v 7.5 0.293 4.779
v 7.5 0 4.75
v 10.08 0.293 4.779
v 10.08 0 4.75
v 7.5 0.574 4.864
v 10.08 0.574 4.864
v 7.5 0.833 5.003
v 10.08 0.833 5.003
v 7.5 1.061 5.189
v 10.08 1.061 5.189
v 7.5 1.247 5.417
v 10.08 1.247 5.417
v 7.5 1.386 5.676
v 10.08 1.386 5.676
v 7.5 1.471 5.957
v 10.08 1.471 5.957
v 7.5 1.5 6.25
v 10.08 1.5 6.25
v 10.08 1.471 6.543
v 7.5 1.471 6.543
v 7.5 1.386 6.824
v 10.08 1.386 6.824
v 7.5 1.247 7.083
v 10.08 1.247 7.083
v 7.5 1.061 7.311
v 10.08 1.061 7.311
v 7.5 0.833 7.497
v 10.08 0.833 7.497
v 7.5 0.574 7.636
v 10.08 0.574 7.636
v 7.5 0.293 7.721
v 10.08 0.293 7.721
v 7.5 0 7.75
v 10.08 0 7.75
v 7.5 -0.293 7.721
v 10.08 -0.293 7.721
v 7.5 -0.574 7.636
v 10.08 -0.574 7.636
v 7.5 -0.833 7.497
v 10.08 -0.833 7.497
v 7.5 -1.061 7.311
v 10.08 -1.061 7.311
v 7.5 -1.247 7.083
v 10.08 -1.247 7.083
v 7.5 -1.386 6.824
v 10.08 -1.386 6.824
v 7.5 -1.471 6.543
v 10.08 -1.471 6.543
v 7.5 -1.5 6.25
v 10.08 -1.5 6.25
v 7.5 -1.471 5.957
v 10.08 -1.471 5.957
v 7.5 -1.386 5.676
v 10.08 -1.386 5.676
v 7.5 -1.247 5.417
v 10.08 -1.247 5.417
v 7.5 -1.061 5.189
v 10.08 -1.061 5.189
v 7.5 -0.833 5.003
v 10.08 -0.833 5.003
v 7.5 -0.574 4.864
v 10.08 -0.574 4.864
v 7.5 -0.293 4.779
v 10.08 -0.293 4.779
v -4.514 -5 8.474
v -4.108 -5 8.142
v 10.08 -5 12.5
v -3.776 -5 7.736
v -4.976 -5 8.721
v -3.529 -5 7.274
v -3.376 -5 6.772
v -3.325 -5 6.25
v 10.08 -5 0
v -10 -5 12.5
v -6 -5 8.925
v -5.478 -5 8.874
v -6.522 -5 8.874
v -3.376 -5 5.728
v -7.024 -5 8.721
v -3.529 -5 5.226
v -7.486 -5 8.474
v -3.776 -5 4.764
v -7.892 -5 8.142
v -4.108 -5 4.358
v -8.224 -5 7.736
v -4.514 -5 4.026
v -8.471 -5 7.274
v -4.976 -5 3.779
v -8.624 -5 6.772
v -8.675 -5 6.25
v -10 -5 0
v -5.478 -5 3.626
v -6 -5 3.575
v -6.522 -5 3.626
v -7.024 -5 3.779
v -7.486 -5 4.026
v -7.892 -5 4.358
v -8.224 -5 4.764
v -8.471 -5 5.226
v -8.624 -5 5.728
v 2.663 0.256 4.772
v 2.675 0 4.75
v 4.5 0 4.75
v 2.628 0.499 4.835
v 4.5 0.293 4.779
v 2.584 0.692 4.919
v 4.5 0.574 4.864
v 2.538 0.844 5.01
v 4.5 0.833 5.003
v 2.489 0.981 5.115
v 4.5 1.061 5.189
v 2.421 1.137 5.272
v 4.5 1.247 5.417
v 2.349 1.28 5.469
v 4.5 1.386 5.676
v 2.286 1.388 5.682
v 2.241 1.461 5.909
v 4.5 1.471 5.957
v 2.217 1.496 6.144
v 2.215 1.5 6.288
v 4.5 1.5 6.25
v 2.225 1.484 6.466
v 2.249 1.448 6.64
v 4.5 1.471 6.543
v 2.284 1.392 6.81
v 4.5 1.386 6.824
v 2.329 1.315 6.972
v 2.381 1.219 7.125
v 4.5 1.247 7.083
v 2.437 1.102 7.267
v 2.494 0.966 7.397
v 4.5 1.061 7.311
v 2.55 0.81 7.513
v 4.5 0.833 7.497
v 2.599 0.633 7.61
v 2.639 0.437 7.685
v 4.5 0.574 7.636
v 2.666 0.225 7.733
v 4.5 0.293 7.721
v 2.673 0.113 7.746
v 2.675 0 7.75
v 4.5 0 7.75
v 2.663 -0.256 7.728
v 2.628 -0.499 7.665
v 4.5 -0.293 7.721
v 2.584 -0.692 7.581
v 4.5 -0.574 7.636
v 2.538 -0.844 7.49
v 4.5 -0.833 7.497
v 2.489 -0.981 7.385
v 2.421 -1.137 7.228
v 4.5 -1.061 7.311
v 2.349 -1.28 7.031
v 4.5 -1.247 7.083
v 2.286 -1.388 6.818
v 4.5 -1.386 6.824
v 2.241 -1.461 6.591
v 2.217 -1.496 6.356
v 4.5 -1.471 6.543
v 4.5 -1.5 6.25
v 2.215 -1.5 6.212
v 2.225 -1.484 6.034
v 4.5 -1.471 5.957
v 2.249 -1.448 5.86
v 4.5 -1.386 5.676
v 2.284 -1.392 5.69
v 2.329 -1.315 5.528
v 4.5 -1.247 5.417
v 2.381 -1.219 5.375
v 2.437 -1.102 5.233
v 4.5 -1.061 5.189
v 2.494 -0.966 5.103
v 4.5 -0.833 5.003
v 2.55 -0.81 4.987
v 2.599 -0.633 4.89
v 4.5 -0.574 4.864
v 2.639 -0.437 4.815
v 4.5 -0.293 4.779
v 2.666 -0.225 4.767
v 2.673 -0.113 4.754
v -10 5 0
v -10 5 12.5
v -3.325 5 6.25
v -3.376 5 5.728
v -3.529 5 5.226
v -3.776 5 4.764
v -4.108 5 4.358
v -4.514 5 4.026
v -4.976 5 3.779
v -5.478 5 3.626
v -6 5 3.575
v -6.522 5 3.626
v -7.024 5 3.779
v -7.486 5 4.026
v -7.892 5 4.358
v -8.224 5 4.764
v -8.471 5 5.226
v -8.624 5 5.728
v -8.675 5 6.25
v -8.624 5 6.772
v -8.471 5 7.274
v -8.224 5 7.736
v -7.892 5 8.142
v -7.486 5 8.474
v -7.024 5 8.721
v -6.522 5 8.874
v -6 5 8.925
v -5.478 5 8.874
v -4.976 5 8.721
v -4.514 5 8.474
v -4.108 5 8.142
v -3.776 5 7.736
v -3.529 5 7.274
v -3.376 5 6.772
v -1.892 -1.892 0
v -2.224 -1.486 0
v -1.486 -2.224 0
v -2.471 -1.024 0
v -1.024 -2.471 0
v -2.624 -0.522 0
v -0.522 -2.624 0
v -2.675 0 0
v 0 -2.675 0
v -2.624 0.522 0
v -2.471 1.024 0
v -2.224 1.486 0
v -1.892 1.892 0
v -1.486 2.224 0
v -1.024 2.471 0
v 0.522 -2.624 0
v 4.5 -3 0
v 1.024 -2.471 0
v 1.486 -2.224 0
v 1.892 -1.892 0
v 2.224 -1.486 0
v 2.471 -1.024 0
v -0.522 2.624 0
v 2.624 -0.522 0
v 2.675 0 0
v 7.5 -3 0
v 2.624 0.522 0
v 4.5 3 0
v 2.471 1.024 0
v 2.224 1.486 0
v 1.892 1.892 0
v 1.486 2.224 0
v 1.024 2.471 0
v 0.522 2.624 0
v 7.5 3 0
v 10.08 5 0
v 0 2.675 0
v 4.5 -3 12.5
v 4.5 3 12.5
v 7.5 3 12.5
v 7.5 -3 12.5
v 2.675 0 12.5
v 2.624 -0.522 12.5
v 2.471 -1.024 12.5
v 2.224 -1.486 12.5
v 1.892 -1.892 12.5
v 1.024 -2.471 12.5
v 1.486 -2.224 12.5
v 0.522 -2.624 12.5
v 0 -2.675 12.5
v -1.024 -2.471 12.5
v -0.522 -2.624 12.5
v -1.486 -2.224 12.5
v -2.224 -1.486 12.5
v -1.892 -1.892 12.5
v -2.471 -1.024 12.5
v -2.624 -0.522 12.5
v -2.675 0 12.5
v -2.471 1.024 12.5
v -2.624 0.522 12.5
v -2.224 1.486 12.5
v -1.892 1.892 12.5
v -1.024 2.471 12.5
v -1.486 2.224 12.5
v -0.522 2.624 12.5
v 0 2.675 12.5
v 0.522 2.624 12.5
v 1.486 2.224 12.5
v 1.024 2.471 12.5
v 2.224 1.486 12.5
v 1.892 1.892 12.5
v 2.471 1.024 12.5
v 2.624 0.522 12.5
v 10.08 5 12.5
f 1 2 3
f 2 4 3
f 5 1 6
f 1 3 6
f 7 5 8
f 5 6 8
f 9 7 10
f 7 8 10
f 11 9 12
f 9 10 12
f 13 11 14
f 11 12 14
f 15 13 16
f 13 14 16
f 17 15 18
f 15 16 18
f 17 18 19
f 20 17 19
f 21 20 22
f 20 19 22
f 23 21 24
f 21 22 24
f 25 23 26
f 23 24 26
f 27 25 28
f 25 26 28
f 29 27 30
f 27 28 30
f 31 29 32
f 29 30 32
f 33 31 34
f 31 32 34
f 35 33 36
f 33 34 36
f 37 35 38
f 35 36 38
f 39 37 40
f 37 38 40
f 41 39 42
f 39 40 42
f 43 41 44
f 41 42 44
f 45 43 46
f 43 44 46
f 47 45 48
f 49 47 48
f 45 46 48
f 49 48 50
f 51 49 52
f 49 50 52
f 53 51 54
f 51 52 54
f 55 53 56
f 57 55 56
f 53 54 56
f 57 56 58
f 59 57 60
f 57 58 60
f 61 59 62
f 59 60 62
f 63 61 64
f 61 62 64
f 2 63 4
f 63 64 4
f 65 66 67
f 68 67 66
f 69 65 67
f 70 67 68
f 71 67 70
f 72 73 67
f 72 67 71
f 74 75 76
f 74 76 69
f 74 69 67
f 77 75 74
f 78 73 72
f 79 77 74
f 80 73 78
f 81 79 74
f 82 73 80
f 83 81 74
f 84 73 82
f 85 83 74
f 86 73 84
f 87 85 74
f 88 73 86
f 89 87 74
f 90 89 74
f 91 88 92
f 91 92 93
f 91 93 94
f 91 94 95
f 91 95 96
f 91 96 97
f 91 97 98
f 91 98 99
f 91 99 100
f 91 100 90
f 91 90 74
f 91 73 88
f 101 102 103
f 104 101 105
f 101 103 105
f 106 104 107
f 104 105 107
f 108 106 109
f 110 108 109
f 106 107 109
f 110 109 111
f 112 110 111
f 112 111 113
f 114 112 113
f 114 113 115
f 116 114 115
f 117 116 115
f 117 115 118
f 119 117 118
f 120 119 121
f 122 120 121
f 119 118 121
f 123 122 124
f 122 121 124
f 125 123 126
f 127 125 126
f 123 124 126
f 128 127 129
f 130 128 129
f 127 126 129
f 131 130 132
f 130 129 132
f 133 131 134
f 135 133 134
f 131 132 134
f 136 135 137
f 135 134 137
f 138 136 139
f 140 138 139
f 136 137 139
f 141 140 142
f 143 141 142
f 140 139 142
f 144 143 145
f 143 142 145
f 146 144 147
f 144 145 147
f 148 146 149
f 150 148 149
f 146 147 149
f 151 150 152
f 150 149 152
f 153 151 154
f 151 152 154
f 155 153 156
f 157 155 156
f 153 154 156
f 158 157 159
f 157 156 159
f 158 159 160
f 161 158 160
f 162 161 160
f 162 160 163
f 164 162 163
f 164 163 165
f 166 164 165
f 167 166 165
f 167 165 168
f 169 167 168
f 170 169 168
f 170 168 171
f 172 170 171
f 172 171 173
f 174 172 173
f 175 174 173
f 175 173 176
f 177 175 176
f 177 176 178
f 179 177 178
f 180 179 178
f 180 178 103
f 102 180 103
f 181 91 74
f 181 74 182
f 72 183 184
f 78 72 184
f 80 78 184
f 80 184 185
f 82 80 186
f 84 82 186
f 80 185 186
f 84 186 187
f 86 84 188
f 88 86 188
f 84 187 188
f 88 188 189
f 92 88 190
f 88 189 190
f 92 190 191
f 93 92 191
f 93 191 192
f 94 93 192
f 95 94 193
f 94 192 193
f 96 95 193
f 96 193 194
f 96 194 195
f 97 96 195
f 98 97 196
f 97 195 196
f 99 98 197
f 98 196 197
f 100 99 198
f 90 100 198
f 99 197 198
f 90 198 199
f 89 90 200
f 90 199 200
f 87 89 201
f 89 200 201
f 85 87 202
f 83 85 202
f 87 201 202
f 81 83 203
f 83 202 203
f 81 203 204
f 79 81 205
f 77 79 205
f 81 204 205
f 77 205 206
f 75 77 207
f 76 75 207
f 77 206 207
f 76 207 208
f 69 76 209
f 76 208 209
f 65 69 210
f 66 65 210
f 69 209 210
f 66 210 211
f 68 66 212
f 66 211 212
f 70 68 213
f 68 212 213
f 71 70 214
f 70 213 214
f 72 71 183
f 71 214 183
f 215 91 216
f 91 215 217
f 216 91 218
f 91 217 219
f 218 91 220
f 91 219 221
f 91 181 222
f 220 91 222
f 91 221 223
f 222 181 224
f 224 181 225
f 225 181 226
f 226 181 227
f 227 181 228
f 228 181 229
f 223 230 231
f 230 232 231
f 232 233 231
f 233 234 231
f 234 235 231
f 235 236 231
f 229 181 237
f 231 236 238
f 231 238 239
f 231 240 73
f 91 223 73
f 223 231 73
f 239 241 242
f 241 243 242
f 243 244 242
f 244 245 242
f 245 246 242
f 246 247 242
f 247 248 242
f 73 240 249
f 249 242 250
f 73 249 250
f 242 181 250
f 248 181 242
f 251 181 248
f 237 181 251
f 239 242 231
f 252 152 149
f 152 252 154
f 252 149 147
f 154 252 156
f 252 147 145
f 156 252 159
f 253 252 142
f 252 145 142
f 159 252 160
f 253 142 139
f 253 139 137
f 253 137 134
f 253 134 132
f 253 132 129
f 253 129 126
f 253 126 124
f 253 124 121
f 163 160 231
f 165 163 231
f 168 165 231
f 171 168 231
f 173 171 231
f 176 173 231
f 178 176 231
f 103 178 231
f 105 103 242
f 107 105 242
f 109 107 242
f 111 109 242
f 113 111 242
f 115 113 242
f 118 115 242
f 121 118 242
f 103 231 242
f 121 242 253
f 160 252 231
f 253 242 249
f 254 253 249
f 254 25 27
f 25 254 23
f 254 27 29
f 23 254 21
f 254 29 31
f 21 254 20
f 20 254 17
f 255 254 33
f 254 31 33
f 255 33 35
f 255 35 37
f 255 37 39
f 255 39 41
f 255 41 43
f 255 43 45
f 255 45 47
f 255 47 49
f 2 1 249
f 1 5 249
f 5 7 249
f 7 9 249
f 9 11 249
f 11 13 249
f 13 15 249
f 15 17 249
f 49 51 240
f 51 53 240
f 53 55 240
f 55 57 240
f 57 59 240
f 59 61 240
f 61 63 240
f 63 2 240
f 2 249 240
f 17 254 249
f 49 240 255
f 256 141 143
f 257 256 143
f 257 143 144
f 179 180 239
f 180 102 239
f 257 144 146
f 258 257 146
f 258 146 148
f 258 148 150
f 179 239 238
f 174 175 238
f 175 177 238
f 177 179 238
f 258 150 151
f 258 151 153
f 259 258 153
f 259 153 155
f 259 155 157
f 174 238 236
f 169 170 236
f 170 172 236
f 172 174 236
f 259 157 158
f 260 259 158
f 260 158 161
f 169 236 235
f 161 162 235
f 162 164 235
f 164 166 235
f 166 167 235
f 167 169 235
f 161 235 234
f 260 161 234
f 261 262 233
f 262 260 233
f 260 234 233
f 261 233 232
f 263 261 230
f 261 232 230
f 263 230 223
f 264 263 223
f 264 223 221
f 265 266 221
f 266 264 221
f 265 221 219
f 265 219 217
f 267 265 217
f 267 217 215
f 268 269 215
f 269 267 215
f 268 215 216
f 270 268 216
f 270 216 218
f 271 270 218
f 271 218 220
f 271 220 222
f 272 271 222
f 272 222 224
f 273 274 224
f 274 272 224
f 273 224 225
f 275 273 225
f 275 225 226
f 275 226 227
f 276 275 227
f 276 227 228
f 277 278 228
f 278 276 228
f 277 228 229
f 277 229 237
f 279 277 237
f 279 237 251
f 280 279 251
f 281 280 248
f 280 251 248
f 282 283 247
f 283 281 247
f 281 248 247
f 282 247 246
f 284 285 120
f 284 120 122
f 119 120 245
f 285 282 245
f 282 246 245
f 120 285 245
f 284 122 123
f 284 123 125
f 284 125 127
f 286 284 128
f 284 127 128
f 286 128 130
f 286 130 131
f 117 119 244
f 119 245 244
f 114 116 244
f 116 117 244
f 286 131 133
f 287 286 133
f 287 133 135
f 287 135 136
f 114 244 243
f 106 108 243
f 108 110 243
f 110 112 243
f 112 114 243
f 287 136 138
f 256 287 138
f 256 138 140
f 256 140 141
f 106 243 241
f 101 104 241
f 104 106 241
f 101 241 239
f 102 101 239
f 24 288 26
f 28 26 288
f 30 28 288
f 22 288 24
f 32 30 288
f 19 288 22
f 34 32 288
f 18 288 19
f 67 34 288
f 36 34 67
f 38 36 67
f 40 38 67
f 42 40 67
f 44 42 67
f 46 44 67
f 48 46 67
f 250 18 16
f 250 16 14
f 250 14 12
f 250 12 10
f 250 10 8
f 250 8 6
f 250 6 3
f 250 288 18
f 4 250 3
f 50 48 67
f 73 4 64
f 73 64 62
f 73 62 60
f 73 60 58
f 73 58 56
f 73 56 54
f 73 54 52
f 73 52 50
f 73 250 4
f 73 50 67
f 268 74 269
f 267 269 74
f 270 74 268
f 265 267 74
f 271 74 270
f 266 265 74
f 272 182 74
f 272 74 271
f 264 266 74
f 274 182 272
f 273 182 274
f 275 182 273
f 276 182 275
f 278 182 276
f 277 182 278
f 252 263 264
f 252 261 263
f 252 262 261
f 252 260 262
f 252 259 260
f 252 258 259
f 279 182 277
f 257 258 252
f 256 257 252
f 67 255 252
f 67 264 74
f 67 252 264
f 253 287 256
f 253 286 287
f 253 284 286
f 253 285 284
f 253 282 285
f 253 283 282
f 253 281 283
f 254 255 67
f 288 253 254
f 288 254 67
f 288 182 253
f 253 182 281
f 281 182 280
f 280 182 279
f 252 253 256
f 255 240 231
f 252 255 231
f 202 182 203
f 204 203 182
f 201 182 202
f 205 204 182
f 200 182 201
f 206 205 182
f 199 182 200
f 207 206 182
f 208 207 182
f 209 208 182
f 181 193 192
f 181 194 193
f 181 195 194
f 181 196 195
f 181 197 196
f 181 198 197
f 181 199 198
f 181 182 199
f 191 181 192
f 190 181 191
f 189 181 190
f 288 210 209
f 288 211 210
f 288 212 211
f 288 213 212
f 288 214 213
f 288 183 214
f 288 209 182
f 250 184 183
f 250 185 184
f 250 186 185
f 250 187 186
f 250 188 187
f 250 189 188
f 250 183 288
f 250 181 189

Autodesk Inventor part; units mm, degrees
ref_plane "YZ Plane" through (0, 0, 0) normal (1, 0, 0) x (0, 1, 0)
ref_plane "XZ Plane" through (0, 0, 0) normal (0, 1, 0) x (-1, 0, 0)
ref_plane "XY Plane" through (0, 0, 0) normal (0, 0, 1) x (1, 0, 0)
sketch "Sketch1" plane through (0, 0, 0) normal (0, 0, 1) x (1, 0, 0)
  circle A0 centre (0, 0) radius 2.675
  line L0 (-10, 5) -> (10.0805, 5)
  line L1 (10.0805, 5) -> (10.0805, -5)
  line L2 (10.0805, -5) -> (-10, -5)
  line L3 (-10, -5) -> (-10, 5)
  line L4 (7.5, -3) -> (4.5, -3)
  line L5 (4.5, -3) -> (4.5, 3)
  line L6 (4.5, 3) -> (7.5, 3)
  line L7 (7.5, 3) -> (7.5, -3)
  line L8 (7.5, -3) -> (4.5, 3) construction
  line L9 (4.5, -3) -> (7.5, 3) construction
  point P0 (6, 0)
  dimension "d0" = 5.35
  dimension "d1" = 5
  dimension "d2" = 5
  dimension "d3" = 10
  dimension "d4" = 3
  dimension "d5" = 6
  dimension "d6" = 6
extrude "Extrusion1" add sketch "Sketch1" along normal blind 12.5
sketch "Sketch2" plane through (10.0805, -5, 0) normal (1, 0, 0) x (0, 0, -1)
  point P0 (0, 5)
sketch "Sketch3" plane through (10.0805, -5, 0) normal (1, 0, 0) x (0, 0, -1)
  line L0 (-12.5, 2.325) -> (0, 2.325) projected
  line L1 (-12.5, 2.325) -> (0, 7.675)
  line L2 (-12.5, 7.675) -> (0, 7.675) projected
  circle A0 centre (-6.25, 5) radius 1.5
  point P0 (0, 5)
  dimension "d9" = 3
extrude "Extrusion2" cut sketch "Sketch3" against normal blind 10.25
sketch "Sketch4" plane through (-10, 5, 0) normal (0, 1, 0) x (1, 0, 0)
  circle A0 centre (4, -6.25) radius 2.675
  line L0 (0, 0) -> (0, -12.5) projected
  point P0 (10, 0)
  dimension "d12" = 5.35
  dimension "d13" = 4
extrude "Extrusion3" cut sketch "Sketch4" against normal blind 14
properties part number "CentralStabalizerShaft"
